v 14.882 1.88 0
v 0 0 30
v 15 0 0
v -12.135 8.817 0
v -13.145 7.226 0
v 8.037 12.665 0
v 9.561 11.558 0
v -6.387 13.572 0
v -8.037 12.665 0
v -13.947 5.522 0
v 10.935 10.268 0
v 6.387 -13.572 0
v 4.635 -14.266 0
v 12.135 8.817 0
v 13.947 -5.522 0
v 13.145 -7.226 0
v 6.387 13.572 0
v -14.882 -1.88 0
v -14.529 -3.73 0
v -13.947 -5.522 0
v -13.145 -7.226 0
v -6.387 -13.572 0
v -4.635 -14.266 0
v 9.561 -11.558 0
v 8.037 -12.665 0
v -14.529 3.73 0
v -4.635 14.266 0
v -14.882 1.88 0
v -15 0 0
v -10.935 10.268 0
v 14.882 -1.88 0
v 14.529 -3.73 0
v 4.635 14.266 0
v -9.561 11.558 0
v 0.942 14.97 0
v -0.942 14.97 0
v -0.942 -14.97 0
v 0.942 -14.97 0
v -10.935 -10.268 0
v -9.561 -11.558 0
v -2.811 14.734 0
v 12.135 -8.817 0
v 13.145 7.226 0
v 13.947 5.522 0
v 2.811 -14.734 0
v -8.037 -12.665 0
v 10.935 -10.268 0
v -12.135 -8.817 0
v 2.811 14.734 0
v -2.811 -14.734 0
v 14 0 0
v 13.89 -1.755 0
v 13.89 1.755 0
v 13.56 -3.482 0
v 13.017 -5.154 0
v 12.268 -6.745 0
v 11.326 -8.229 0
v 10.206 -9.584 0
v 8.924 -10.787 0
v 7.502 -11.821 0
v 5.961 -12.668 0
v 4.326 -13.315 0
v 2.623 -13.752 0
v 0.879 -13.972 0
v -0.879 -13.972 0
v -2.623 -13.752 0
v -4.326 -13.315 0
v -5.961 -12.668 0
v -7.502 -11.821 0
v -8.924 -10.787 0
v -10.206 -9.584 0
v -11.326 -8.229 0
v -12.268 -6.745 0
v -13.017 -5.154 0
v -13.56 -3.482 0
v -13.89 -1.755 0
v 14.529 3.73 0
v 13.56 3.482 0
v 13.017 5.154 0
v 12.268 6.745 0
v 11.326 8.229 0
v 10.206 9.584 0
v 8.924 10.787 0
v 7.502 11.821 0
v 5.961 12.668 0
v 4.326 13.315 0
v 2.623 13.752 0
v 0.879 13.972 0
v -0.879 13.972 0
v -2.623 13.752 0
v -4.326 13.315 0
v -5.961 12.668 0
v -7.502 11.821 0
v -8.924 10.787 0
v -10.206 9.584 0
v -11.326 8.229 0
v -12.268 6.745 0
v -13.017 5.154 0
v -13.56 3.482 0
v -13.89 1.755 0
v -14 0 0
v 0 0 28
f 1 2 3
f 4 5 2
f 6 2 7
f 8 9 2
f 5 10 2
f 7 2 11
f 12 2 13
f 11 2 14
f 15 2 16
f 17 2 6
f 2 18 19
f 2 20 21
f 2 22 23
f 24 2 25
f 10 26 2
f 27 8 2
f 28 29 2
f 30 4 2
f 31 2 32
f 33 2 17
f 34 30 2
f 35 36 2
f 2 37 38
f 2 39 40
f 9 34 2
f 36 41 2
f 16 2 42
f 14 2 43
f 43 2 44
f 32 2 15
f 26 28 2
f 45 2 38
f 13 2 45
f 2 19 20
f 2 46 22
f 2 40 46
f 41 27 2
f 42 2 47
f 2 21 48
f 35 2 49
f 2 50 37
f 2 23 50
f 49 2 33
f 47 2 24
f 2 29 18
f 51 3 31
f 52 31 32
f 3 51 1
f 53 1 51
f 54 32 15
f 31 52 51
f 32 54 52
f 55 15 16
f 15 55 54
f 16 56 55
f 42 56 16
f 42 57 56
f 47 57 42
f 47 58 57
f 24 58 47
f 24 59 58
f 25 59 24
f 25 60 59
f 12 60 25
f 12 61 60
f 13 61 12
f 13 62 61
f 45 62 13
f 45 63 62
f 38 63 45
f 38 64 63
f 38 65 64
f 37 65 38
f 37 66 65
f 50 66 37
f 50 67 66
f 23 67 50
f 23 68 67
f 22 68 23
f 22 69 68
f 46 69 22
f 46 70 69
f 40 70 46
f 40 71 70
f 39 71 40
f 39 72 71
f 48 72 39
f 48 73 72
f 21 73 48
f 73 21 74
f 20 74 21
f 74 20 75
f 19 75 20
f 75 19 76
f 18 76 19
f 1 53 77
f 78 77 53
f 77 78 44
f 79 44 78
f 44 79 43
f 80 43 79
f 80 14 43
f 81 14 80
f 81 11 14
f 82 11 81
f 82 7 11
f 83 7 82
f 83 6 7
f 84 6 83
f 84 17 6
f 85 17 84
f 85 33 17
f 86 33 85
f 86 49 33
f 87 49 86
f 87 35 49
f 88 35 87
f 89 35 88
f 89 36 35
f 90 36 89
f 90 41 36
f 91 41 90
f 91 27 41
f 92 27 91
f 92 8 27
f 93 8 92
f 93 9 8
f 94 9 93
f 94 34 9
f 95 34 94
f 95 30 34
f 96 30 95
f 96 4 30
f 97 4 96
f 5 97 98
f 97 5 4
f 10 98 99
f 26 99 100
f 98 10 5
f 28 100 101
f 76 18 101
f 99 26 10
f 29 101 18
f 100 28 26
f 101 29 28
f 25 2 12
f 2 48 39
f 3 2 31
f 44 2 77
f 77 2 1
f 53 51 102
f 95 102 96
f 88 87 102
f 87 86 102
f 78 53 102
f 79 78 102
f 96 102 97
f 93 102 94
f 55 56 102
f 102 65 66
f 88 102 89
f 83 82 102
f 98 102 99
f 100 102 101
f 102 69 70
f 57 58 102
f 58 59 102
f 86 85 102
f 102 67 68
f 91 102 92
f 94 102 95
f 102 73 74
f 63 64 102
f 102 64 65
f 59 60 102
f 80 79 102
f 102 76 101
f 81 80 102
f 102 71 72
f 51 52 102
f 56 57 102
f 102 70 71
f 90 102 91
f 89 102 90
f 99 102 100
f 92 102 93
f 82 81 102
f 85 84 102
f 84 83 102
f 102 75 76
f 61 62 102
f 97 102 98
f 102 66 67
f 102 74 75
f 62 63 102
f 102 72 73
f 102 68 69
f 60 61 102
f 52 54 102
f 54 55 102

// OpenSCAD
// cone height
conus_height = 30;
// cone diameter
conus_diameter = 30;
// cone thickness
conus_thickness = 2;
// cone fn (>=3)
conus_fn = 50;

conus2_height = conus_height-conus_thickness;
conus2_diameter = conus_diameter-conus_thickness;

difference(){
  cylinder(h=conus_height, d1=conus_diameter, d2=0, $fn=conus_fn);
  cylinder(h=conus2_height, d1=conus2_diameter, d2=0, $fn=conus_fn);
}
